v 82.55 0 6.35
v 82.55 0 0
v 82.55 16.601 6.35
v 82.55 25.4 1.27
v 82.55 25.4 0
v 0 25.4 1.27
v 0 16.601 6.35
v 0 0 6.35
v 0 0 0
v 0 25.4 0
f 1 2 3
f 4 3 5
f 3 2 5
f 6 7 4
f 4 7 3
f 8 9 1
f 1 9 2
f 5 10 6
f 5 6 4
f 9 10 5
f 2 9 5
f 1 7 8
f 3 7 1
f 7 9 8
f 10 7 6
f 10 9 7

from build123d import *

# Parameters (mm, degrees)
SKETCH1_W           = 82.55
SKETCH1_H           = 25.4
BOSS_EXTRUDE1_DEPTH = 6.35
CHAMFER1_SIZE       = 5.08
CHAMFER1_SIZE2      = 8.798818102


with BuildPart() as part:
    # Sketch1 → Boss-Extrude1 (new body)
    with BuildSketch(Plane.XY):
        with Locations((41.275, 12.7)):
            Rectangle(SKETCH1_W, SKETCH1_H)
    extrude(amount=BOSS_EXTRUDE1_DEPTH)

    # Chamfer1
    chamfer1_edges = [part.edges().sort_by_distance(p)[0] for p in [
        (41.275, 25.4, 6.35),
    ]]
    chamfer1_side = [part.faces().sort_by_distance(p)[0] for p in [
        (41.275, 25.4, 3.175),
    ]]
    chamfer(chamfer1_edges, length=CHAMFER1_SIZE, length2=CHAMFER1_SIZE2, reference=chamfer1_side[0])


solid = part.part
